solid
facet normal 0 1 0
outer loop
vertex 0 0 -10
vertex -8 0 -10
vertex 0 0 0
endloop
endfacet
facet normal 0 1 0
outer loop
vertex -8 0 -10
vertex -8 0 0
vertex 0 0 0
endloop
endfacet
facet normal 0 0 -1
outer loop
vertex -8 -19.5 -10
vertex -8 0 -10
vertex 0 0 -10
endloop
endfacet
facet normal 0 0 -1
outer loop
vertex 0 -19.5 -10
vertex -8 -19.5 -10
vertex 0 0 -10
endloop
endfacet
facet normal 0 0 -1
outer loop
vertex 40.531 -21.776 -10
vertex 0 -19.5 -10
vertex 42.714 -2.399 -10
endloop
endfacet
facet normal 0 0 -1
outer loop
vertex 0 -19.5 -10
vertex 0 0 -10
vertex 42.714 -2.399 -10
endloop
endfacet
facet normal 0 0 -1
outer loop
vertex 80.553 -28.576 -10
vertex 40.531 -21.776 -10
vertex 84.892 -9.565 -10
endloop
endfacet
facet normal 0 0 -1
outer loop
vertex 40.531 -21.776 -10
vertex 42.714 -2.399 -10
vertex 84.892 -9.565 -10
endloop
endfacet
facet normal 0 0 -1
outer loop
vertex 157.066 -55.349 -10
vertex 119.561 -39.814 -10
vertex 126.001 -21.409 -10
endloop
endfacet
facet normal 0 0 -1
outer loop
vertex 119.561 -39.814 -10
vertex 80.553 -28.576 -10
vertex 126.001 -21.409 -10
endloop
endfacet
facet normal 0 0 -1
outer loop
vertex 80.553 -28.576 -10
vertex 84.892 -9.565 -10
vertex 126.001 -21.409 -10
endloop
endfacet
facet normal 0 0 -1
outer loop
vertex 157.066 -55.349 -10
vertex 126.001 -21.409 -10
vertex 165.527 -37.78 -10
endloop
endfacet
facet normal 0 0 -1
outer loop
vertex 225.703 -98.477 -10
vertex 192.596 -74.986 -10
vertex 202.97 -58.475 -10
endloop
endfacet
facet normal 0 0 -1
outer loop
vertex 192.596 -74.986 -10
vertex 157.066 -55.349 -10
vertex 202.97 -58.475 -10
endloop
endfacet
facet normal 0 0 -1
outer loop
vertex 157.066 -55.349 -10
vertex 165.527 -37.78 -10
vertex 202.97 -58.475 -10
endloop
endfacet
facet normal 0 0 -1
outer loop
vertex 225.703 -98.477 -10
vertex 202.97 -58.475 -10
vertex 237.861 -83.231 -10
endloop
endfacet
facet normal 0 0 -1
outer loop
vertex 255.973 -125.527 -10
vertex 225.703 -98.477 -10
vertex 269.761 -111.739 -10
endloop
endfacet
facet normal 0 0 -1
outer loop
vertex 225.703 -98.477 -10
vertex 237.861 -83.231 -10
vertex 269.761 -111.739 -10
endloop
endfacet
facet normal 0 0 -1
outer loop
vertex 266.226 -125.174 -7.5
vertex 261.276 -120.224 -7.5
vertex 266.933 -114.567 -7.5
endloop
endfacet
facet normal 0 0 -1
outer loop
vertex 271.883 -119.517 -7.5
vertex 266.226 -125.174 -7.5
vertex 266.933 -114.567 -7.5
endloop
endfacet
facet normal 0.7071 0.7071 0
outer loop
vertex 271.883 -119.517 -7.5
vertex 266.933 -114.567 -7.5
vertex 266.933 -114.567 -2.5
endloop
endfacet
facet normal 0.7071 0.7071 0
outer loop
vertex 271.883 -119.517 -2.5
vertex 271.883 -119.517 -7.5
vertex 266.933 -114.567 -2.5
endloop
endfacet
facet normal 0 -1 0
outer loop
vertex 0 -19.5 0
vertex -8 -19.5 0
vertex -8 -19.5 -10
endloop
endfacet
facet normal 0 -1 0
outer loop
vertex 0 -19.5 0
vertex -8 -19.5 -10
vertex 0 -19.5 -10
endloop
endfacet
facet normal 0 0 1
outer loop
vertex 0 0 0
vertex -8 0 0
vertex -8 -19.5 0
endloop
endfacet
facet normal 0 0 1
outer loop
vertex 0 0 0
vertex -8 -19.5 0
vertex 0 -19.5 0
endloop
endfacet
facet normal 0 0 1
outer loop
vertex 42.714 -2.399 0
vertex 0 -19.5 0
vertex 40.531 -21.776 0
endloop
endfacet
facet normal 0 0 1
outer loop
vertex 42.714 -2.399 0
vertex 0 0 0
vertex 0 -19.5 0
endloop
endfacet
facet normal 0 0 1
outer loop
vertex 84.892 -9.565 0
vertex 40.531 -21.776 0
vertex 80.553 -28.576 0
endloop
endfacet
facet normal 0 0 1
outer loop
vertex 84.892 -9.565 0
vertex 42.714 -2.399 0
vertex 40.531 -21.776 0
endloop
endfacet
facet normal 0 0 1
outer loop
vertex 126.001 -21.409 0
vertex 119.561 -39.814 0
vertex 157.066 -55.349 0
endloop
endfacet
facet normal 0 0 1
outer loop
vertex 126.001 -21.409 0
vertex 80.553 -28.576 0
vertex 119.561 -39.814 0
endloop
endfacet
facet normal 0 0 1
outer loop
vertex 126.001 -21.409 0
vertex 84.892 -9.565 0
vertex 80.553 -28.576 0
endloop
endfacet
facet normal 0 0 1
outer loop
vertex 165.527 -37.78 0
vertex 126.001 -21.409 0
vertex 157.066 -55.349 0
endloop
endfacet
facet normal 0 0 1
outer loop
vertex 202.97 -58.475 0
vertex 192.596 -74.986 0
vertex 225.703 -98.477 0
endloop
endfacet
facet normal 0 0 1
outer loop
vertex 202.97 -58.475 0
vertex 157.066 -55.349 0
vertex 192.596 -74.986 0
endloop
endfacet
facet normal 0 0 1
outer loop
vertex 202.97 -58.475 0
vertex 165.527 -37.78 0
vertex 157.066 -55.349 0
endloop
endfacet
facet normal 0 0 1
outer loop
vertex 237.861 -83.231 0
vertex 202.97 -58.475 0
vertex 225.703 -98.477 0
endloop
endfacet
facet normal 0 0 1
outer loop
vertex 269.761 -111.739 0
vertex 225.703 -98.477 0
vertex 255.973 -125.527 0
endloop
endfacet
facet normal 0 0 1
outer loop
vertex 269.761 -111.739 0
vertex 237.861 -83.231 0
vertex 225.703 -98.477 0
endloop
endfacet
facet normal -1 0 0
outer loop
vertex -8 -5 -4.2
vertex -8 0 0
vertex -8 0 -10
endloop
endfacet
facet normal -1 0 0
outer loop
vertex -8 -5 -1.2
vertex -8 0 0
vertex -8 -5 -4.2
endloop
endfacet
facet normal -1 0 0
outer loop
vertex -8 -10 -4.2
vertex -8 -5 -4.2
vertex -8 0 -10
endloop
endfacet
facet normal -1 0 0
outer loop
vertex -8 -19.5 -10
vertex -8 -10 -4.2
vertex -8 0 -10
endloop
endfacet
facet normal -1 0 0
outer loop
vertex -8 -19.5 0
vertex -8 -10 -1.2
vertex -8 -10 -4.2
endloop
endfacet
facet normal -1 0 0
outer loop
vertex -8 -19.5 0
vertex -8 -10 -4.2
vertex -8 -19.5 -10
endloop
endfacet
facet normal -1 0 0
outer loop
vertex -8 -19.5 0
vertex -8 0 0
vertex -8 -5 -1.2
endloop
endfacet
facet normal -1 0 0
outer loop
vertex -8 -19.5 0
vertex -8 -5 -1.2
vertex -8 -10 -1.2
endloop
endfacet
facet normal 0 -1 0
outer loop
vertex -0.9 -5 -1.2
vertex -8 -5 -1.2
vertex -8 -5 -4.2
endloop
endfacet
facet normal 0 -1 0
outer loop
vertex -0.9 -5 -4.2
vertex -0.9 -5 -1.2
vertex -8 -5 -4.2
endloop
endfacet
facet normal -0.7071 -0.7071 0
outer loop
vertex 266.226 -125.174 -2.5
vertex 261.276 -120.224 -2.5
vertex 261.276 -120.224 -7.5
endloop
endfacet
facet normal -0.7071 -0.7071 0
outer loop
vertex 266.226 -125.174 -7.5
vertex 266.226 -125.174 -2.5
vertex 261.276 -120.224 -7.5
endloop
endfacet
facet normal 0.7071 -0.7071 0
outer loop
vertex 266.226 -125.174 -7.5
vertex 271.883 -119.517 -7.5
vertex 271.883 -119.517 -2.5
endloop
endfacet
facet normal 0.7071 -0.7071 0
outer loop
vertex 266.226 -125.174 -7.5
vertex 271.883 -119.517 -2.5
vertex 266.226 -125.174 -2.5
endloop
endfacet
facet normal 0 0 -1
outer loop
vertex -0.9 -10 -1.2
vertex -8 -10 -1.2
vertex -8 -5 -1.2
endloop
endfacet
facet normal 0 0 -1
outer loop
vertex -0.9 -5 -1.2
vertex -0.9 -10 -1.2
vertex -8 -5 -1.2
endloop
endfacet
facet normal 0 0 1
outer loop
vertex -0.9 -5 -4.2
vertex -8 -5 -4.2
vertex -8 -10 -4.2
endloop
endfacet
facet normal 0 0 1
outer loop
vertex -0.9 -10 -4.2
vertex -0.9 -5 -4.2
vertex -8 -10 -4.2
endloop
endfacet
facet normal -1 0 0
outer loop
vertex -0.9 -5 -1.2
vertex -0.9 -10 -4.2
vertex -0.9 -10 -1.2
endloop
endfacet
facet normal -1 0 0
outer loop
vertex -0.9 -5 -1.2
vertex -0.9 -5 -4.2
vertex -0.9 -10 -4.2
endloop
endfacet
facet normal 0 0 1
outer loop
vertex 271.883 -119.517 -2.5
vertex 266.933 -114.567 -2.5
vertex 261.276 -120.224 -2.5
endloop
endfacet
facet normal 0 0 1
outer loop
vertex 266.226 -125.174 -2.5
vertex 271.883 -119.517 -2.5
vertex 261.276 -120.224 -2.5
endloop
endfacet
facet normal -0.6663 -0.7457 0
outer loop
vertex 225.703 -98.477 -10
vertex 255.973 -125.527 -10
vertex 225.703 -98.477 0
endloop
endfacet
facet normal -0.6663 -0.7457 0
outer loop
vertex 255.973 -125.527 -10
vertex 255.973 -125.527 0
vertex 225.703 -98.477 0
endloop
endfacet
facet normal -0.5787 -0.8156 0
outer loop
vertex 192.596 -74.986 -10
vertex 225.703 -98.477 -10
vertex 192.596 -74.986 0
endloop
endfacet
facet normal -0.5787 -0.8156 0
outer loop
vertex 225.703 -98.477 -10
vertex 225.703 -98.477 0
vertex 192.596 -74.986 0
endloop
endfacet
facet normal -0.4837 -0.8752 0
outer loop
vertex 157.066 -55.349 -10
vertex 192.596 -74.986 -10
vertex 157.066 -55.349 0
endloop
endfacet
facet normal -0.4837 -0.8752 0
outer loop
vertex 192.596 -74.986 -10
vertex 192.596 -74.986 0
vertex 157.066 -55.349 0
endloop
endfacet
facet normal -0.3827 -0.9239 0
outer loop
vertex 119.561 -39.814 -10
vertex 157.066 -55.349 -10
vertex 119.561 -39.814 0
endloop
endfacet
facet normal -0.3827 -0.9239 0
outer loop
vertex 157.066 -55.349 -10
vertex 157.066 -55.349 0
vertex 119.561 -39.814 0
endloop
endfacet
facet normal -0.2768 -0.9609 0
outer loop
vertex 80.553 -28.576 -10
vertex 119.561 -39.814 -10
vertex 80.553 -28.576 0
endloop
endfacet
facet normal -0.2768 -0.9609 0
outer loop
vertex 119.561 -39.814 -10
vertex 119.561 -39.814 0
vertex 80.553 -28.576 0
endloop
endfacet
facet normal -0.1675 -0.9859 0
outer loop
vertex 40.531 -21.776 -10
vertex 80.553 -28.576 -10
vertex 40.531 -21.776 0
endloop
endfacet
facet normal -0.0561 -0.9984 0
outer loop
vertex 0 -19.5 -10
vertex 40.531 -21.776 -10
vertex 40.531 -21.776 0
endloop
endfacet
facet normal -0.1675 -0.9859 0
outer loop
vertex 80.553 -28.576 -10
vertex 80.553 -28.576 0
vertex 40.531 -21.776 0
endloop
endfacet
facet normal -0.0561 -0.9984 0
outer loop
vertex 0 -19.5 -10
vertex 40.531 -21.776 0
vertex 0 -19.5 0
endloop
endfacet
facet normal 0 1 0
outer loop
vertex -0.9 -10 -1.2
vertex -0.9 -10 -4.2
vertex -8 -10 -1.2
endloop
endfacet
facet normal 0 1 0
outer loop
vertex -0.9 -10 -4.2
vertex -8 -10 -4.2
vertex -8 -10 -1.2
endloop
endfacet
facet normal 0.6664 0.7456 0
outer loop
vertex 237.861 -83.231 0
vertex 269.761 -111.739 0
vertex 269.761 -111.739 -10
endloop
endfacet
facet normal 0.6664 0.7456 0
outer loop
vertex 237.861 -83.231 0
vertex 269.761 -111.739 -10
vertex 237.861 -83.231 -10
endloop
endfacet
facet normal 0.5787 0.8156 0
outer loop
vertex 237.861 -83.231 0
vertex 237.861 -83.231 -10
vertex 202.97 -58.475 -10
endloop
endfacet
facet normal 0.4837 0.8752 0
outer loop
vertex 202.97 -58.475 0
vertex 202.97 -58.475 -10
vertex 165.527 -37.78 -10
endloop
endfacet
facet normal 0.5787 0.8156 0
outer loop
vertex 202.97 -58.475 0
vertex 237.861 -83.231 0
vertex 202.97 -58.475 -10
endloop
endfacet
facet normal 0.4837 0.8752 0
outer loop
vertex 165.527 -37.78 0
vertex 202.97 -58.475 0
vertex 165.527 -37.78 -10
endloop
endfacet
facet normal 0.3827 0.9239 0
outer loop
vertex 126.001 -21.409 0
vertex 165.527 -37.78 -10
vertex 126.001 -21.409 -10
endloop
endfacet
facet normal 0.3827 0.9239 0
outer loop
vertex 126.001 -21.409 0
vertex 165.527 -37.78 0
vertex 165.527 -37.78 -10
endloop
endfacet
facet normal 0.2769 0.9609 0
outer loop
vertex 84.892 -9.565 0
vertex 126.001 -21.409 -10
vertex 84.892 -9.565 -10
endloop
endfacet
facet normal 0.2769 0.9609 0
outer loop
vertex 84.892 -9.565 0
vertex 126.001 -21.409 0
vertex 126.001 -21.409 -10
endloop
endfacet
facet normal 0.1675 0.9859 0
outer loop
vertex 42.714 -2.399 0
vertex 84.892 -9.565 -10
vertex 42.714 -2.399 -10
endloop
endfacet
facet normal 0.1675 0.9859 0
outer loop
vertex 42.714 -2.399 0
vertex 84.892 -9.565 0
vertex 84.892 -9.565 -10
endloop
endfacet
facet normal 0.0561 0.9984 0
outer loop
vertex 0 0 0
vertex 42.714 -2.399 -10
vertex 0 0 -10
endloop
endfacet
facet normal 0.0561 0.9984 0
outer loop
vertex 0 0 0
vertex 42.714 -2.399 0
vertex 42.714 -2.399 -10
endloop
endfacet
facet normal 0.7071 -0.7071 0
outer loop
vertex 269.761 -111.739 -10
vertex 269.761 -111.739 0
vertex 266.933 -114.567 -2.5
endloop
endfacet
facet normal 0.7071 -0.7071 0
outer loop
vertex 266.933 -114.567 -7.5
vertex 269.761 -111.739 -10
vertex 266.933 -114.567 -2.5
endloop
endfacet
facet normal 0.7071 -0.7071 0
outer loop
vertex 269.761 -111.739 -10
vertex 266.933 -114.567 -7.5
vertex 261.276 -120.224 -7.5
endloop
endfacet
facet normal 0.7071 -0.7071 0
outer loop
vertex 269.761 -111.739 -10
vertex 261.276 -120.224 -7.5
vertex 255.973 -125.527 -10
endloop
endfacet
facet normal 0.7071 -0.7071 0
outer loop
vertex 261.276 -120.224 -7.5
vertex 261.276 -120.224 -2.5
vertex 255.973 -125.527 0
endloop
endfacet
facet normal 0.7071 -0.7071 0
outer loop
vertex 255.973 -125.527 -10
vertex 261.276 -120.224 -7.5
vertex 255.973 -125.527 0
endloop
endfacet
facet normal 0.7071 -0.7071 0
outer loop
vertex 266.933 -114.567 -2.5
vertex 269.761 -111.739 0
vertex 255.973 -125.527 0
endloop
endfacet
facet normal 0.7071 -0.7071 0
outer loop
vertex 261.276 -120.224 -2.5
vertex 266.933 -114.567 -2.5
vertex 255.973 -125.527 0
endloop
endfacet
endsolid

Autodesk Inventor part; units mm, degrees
ref_plane "YZ Plane" through (0, 0, 0) normal (1, 0, 0) x (0, 1, 0)
ref_plane "XZ Plane" through (0, 0, 0) normal (0, 1, 0) x (-1, 0, 0)
ref_plane "XY Plane" through (0, 0, 0) normal (0, 0, 1) x (1, 0, 0)
sketch "Sketch1" plane through (0, 0, 0) normal (0, 0, 1) x (1, 0, 0)
  arc A0 (381.5, -381.5) -> (0, 0) centre (0, -381.5) ccw projected
  line L0 (-227, 0) -> (0, 0) projected
  line L1 (381.5, -381.5) -> (381.5, -681.5) projected
  line L2 (-227, -19.5) -> (0, -19.5)
  arc A1 (362, -381.5) -> (0, -19.5) centre (0, -381.5) ccw
  line L3 (362, -381.5) -> (362, -681.5)
  line L4 (-8, 0) -> (-8, -19.5)
  line L5 (381.5, -389.5) -> (362, -389.5)
  line L6 (269.7612, -111.7388) -> (255.9727, -125.5273)
  dimension "d0" = 19.5
  dimension "d1" = 8
  dimension "d2" = 8
extrude "Extrusion1" add sketch "Sketch1" against normal blind 10 contours L6 A1 L2 L4 L0 A0
sketch "Sketch2" plane through (-8, -19.5, 0) normal (-1, 0, 0) x (0, 0, 1)
  line L0 (0, 19.5) -> (0, 0) projected
  line L1 (0, 19.5) -> (-10, 19.5) projected
  line L2 (-10, 0) -> (-10, 19.5) projected
  line L3 (0, 0) -> (-10, 0) projected
  line L4 (-1.2, 14.5) -> (-4.2, 14.5)
  line L5 (-4.2, 14.5) -> (-4.2, 9.5)
  line L6 (-4.2, 9.5) -> (-1.2, 9.5)
  line L7 (-1.2, 9.5) -> (-1.2, 14.5)
  line L8 (-1.2, 14.5) -> (-4.2, 9.5) construction
  line L9 (-4.2, 14.5) -> (-1.2, 9.5) construction
  point P0 (0, 19.5)
  point P1 (-2.7, 12)
  dimension "d5" = 3
  dimension "d6" = 5
  dimension "d7" = 1.2
  dimension "d8" = 5
extrude "Extrusion2" cut sketch "Sketch2" against normal blind 7.1 contours L7 L6 L5 L4
sketch "Sketch3" plane through (255.9727, -125.5273, 0) normal (0.7071, -0.7071, 0) x (-0.7071, -0.7071, 0)
  line L0 (0, 0) -> (-19.5, 0) projected
  line L1 (0, 0) -> (0, 10) projected
  line L2 (-19.5, 10) -> (0, 10) projected
  line L3 (-19.5, 0) -> (-19.5, 10) projected
  line L4 (-15.5, 2.5) -> (-7.5, 2.5)
  line L5 (-7.5, 2.5) -> (-7.5, 7.5)
  line L6 (-7.5, 7.5) -> (-15.5, 7.5)
  line L7 (-15.5, 7.5) -> (-15.5, 2.5)
  line L8 (-15.5, 2.5) -> (-7.5, 7.5) construction
  line L9 (-7.5, 2.5) -> (-15.5, 7.5) construction
  point P0 (92.2388, 0)
  point P1 (-11.5, 5)
  point P2 (-15.5, 5)
  point P3 (-19.5, 5)
  dimension "d11" = 8
  dimension "d12" = 5
  dimension "d13" = 4
extrude "Extrusion3" add sketch "Sketch3" along normal blind 7 contours L7 L6 L5 L4
properties part number "SEPARADOR_3"
